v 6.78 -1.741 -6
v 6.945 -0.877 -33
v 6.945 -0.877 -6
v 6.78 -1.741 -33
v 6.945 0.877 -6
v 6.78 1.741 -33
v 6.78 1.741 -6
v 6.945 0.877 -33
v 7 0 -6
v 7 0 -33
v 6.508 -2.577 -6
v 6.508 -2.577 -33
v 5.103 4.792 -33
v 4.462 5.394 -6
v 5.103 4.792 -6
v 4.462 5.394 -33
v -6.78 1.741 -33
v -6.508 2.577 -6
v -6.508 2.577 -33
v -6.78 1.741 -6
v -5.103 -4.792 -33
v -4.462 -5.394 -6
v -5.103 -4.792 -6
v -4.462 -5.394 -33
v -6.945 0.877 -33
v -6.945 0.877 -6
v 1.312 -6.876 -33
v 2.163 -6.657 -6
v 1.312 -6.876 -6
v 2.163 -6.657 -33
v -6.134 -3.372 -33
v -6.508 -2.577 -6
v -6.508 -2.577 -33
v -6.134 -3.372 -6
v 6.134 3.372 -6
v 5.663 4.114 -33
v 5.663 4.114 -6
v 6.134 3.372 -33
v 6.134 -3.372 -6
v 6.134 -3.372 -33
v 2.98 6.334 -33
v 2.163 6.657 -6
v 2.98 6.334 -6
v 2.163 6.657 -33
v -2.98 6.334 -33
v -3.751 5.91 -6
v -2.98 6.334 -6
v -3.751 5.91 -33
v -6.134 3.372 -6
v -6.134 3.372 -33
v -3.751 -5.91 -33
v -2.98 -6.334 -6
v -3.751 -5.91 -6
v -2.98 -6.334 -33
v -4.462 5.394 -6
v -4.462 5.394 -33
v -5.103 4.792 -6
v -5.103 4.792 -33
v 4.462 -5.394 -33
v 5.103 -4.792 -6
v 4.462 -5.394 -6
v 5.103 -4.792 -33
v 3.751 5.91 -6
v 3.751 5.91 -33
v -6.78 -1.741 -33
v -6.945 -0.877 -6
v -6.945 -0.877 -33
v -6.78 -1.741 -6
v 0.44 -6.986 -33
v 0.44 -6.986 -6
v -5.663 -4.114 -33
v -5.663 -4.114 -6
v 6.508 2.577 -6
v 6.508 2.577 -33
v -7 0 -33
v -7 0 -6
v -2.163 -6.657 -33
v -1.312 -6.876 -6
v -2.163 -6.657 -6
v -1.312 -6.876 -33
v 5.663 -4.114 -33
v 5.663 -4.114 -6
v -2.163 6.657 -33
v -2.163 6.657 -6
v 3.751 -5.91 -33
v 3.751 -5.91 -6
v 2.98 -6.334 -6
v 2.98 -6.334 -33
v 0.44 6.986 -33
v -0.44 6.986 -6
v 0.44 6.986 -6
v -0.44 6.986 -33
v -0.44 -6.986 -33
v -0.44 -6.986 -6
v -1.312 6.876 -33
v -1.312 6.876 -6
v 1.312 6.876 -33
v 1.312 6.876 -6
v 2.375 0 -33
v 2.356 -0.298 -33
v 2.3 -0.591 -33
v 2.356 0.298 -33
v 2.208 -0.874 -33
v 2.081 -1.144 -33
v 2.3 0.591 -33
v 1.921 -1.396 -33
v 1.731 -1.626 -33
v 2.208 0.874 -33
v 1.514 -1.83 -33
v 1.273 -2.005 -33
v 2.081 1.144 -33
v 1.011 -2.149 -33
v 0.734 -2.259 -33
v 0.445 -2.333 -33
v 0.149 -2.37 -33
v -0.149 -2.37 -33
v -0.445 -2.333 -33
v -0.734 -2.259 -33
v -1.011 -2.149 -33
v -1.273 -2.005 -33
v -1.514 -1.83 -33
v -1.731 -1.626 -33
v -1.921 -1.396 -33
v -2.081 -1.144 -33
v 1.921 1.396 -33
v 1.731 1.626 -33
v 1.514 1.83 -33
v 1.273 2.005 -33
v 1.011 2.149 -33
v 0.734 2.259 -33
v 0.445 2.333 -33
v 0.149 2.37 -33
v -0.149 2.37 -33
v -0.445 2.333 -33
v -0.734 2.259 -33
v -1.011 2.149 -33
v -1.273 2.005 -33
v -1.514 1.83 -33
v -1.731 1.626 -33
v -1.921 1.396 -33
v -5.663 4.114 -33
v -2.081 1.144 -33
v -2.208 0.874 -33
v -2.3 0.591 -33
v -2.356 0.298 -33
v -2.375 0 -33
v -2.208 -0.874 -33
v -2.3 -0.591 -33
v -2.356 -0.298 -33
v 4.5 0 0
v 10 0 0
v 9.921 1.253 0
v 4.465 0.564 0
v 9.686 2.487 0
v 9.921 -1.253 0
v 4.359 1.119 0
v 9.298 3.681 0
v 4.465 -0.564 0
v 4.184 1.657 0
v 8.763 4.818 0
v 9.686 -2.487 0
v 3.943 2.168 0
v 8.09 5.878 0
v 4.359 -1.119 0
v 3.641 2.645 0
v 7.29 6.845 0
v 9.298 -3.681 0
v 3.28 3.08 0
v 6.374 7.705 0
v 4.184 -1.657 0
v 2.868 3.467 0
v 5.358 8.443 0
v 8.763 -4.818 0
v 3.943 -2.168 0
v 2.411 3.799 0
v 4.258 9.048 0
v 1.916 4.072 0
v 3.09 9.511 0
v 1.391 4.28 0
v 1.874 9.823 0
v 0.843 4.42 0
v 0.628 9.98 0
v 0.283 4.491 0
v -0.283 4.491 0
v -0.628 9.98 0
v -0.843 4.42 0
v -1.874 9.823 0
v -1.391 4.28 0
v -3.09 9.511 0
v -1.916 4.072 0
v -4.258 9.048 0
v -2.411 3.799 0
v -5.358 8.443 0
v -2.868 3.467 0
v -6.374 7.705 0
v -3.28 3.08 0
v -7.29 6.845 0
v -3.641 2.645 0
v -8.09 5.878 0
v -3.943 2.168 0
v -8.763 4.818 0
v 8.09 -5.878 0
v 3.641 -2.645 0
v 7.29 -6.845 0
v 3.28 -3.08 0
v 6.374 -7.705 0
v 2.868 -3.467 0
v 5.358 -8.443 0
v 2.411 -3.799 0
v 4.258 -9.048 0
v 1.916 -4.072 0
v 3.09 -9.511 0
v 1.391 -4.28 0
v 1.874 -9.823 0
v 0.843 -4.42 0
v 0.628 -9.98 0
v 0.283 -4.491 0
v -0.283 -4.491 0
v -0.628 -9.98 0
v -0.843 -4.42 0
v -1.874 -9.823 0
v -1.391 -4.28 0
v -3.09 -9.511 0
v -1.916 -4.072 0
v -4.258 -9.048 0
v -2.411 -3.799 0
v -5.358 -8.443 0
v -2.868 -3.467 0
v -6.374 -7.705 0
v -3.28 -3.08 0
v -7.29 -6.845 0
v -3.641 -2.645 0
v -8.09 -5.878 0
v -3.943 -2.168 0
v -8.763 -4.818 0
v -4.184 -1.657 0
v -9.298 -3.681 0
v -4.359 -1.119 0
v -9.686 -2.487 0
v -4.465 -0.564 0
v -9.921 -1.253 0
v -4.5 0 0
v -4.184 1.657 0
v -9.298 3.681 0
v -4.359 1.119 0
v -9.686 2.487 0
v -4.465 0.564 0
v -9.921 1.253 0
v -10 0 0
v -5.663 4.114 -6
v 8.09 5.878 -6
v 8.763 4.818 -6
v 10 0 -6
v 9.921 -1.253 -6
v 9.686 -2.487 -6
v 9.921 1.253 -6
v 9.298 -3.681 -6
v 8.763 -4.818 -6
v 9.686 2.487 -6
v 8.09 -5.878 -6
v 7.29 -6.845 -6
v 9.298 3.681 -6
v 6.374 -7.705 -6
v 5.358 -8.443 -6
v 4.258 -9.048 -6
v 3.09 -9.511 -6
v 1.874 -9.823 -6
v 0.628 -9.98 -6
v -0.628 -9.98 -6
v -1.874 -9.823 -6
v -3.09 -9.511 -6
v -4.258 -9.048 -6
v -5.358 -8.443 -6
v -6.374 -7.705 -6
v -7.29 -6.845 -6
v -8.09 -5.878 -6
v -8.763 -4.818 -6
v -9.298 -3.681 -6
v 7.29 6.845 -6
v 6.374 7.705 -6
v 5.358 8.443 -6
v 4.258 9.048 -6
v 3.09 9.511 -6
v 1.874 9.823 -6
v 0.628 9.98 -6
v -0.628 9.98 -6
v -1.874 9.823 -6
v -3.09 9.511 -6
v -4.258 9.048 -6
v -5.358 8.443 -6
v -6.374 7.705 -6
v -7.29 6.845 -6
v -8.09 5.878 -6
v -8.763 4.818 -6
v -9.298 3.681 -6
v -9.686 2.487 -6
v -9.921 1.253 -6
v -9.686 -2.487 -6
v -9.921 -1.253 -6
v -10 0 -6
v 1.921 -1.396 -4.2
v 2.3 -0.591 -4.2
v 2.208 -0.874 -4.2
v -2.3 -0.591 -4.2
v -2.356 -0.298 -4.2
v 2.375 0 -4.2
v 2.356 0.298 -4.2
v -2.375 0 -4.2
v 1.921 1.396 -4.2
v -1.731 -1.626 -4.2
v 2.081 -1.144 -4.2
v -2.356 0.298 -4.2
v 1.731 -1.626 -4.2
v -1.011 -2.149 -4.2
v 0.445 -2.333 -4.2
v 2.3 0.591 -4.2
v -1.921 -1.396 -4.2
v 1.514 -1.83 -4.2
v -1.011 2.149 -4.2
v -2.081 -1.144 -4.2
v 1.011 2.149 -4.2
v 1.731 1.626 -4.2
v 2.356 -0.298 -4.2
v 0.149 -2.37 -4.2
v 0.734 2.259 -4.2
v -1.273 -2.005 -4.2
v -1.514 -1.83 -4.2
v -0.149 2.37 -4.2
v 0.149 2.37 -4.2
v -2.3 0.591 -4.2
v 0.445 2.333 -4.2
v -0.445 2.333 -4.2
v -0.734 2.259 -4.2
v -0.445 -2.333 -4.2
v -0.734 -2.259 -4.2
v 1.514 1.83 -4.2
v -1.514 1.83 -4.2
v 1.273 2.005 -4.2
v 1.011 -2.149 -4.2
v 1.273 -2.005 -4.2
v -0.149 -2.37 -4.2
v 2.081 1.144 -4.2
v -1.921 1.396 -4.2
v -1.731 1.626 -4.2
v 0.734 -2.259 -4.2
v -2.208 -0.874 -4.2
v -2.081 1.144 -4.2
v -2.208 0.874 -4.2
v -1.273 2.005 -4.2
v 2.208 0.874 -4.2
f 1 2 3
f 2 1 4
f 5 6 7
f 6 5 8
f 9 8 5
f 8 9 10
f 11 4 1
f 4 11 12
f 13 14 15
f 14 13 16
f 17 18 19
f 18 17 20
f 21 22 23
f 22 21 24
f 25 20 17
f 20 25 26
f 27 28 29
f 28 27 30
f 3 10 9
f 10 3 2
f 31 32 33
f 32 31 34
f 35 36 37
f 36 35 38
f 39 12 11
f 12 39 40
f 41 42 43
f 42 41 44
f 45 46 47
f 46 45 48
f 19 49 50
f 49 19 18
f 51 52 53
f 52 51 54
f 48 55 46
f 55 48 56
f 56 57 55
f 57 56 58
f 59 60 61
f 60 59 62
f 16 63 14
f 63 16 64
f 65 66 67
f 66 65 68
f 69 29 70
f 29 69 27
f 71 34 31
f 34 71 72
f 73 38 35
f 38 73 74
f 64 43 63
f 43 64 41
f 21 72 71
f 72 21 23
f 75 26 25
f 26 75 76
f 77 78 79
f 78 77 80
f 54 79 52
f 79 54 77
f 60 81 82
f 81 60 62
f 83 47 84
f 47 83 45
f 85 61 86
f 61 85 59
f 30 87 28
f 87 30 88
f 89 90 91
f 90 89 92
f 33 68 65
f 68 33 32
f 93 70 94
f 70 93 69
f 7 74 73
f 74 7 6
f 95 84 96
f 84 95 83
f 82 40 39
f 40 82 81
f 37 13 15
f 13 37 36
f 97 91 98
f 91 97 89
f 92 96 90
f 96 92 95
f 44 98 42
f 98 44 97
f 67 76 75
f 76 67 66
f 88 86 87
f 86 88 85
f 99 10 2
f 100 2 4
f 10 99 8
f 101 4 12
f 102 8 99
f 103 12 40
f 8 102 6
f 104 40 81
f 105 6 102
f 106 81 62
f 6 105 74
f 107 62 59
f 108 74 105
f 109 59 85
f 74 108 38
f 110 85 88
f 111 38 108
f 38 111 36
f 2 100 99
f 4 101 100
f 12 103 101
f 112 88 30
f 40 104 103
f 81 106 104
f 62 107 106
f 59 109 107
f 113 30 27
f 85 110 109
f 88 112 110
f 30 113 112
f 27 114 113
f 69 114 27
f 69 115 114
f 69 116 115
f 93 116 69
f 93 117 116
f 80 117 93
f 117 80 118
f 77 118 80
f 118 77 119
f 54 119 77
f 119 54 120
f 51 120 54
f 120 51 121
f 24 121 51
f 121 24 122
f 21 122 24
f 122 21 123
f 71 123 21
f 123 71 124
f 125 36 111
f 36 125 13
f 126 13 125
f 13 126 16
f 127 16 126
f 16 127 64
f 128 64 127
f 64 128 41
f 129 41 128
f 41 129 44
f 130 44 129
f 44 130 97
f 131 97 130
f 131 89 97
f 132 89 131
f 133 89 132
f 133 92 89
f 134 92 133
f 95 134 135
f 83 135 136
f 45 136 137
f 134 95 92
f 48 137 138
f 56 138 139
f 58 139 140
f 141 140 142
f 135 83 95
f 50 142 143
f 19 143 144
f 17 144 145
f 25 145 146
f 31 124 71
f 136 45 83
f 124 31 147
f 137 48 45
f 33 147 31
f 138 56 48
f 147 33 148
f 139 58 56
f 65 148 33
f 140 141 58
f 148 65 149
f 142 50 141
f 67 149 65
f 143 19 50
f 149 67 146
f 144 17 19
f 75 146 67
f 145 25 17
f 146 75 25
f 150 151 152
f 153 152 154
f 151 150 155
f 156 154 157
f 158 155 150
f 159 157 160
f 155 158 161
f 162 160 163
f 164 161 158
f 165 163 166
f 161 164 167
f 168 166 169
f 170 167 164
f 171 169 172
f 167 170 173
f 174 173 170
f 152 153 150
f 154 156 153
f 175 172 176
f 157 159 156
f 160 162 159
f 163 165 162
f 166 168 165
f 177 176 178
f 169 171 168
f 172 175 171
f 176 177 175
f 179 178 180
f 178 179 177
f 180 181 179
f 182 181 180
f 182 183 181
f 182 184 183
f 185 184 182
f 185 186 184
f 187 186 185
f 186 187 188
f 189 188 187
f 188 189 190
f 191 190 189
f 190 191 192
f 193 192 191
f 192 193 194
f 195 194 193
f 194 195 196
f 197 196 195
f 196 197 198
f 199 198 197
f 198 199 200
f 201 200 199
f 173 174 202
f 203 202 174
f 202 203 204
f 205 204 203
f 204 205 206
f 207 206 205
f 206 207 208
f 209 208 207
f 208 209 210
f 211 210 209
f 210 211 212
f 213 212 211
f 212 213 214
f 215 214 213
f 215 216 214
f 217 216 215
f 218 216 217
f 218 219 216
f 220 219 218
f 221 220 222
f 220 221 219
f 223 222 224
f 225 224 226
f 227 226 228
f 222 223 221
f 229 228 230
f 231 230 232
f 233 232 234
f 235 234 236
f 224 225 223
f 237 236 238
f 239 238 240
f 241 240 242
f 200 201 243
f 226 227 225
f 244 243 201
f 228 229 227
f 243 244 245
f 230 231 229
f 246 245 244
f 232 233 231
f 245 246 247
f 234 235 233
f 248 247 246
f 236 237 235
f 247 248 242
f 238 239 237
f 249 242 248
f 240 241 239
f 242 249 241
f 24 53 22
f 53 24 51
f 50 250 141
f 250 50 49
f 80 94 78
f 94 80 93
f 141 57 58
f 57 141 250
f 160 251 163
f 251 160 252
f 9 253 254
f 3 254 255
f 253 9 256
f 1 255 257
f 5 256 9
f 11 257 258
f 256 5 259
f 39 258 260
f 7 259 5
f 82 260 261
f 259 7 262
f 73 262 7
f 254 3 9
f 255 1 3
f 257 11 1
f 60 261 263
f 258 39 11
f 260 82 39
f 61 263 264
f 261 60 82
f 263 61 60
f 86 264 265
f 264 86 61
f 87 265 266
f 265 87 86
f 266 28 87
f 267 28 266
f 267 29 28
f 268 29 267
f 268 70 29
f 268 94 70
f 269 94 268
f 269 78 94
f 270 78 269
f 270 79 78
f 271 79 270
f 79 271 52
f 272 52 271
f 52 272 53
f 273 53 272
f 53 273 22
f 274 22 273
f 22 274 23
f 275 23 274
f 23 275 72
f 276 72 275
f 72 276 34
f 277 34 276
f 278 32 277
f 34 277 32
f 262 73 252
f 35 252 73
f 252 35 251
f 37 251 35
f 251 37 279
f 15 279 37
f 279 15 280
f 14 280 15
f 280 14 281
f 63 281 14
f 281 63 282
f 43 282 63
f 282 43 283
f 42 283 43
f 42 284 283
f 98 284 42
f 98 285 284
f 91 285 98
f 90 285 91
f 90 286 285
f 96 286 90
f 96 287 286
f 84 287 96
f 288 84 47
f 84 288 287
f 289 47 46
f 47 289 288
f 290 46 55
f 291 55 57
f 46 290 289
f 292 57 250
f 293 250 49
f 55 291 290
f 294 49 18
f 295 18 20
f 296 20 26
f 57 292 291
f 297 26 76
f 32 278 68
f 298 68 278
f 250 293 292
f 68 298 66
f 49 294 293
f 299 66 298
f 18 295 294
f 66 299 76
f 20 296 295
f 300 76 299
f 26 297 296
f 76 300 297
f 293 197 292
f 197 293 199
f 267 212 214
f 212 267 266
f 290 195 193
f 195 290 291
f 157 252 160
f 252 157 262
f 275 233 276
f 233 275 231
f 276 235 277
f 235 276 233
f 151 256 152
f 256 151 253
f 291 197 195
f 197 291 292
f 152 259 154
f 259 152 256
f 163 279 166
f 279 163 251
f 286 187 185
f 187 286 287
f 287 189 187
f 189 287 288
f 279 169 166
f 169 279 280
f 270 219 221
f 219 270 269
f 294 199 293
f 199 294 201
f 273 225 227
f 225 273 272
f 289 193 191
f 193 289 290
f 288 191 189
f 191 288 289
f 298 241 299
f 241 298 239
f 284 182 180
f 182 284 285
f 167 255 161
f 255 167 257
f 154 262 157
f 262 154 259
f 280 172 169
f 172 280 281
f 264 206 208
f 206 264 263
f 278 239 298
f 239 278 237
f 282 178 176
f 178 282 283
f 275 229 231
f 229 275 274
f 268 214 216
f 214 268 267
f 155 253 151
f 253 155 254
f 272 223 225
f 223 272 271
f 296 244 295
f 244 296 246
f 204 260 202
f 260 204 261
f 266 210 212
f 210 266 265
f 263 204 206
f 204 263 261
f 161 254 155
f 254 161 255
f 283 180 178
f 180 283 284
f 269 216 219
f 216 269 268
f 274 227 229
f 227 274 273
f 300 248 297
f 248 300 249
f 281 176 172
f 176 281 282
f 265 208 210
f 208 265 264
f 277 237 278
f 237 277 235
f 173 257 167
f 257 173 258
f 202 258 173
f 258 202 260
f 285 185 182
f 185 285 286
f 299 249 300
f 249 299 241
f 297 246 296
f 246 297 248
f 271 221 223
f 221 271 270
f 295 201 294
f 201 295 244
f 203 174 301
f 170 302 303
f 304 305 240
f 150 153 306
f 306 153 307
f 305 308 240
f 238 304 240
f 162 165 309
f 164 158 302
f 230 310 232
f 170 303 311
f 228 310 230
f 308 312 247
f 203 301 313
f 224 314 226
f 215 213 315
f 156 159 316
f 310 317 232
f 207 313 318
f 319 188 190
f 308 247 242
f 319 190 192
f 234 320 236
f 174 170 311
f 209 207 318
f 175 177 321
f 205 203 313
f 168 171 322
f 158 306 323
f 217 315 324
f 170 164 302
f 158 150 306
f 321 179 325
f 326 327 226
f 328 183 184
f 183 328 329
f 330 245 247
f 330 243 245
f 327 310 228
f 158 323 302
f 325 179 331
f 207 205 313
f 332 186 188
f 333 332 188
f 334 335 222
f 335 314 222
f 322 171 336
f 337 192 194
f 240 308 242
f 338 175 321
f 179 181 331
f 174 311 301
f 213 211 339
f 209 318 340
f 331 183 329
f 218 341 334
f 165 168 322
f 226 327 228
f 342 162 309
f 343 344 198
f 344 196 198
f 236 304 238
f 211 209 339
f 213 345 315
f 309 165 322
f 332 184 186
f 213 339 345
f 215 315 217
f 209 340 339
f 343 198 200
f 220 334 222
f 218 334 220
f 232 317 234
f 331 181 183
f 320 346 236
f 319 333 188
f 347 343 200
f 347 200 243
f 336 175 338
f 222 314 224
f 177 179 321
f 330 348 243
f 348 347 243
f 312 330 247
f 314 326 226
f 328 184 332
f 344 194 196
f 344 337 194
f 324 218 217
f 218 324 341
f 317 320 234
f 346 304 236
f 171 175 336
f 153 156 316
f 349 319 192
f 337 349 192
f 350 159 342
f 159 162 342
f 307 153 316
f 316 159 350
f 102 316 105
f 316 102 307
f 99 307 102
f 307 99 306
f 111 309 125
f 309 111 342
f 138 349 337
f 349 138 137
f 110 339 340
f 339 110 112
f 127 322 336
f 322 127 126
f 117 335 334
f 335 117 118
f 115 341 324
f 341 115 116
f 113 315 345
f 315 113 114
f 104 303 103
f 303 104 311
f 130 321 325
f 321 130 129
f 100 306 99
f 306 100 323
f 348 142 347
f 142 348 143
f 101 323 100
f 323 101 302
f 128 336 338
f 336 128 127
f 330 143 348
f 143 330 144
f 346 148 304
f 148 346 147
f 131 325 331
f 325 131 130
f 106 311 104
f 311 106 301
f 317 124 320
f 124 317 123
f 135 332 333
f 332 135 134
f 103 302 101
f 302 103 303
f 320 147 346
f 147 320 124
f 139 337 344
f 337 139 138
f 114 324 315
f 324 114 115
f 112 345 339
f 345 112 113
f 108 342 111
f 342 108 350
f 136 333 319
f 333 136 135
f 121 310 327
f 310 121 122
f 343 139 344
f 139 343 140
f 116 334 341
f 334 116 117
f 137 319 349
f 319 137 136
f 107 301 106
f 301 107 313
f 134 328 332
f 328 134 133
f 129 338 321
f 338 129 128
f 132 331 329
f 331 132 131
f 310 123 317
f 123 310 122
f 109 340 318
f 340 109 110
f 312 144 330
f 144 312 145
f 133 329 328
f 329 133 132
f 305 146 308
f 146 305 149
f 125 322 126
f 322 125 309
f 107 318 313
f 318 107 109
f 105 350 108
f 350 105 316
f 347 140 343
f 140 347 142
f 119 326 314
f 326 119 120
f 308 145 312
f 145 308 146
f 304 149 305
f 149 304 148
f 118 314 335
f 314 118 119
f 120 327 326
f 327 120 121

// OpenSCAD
$fn = 50;


difference() {
	union() {
		translate(v = [0, 0, -33.0000000000]) {
			cylinder(h = 33, r = 7.0000000000);
		}
		translate(v = [0, 0, -6.0000000000]) {
			cylinder(h = 6, r = 10.0000000000);
		}
	}
	union() {
		translate(v = [0, 0, 0]) {
			rotate(a = [0, 0, 0]) {
				difference() {
					union() {
						#translate(v = [0, 0, -33.0000000000]) {
							cylinder(h = 33, r = 2.2500000000);
						}
						#translate(v = [0, 0, -4.2000000000]) {
							cylinder(h = 4.2000000000, r = 7.0000000000, r1 = 2.3750000000, r2 = 4.5000000000);
						}
						#translate(v = [0, 0, -33.0000000000]) {
							cylinder(h = 33, r = 2.3750000000);
						}
						#translate(v = [0, 0, -33.0000000000]) {
							cylinder(h = 33, r = 2.2500000000);
						}
					}
					union();
				}
			}
		}
	}
}
